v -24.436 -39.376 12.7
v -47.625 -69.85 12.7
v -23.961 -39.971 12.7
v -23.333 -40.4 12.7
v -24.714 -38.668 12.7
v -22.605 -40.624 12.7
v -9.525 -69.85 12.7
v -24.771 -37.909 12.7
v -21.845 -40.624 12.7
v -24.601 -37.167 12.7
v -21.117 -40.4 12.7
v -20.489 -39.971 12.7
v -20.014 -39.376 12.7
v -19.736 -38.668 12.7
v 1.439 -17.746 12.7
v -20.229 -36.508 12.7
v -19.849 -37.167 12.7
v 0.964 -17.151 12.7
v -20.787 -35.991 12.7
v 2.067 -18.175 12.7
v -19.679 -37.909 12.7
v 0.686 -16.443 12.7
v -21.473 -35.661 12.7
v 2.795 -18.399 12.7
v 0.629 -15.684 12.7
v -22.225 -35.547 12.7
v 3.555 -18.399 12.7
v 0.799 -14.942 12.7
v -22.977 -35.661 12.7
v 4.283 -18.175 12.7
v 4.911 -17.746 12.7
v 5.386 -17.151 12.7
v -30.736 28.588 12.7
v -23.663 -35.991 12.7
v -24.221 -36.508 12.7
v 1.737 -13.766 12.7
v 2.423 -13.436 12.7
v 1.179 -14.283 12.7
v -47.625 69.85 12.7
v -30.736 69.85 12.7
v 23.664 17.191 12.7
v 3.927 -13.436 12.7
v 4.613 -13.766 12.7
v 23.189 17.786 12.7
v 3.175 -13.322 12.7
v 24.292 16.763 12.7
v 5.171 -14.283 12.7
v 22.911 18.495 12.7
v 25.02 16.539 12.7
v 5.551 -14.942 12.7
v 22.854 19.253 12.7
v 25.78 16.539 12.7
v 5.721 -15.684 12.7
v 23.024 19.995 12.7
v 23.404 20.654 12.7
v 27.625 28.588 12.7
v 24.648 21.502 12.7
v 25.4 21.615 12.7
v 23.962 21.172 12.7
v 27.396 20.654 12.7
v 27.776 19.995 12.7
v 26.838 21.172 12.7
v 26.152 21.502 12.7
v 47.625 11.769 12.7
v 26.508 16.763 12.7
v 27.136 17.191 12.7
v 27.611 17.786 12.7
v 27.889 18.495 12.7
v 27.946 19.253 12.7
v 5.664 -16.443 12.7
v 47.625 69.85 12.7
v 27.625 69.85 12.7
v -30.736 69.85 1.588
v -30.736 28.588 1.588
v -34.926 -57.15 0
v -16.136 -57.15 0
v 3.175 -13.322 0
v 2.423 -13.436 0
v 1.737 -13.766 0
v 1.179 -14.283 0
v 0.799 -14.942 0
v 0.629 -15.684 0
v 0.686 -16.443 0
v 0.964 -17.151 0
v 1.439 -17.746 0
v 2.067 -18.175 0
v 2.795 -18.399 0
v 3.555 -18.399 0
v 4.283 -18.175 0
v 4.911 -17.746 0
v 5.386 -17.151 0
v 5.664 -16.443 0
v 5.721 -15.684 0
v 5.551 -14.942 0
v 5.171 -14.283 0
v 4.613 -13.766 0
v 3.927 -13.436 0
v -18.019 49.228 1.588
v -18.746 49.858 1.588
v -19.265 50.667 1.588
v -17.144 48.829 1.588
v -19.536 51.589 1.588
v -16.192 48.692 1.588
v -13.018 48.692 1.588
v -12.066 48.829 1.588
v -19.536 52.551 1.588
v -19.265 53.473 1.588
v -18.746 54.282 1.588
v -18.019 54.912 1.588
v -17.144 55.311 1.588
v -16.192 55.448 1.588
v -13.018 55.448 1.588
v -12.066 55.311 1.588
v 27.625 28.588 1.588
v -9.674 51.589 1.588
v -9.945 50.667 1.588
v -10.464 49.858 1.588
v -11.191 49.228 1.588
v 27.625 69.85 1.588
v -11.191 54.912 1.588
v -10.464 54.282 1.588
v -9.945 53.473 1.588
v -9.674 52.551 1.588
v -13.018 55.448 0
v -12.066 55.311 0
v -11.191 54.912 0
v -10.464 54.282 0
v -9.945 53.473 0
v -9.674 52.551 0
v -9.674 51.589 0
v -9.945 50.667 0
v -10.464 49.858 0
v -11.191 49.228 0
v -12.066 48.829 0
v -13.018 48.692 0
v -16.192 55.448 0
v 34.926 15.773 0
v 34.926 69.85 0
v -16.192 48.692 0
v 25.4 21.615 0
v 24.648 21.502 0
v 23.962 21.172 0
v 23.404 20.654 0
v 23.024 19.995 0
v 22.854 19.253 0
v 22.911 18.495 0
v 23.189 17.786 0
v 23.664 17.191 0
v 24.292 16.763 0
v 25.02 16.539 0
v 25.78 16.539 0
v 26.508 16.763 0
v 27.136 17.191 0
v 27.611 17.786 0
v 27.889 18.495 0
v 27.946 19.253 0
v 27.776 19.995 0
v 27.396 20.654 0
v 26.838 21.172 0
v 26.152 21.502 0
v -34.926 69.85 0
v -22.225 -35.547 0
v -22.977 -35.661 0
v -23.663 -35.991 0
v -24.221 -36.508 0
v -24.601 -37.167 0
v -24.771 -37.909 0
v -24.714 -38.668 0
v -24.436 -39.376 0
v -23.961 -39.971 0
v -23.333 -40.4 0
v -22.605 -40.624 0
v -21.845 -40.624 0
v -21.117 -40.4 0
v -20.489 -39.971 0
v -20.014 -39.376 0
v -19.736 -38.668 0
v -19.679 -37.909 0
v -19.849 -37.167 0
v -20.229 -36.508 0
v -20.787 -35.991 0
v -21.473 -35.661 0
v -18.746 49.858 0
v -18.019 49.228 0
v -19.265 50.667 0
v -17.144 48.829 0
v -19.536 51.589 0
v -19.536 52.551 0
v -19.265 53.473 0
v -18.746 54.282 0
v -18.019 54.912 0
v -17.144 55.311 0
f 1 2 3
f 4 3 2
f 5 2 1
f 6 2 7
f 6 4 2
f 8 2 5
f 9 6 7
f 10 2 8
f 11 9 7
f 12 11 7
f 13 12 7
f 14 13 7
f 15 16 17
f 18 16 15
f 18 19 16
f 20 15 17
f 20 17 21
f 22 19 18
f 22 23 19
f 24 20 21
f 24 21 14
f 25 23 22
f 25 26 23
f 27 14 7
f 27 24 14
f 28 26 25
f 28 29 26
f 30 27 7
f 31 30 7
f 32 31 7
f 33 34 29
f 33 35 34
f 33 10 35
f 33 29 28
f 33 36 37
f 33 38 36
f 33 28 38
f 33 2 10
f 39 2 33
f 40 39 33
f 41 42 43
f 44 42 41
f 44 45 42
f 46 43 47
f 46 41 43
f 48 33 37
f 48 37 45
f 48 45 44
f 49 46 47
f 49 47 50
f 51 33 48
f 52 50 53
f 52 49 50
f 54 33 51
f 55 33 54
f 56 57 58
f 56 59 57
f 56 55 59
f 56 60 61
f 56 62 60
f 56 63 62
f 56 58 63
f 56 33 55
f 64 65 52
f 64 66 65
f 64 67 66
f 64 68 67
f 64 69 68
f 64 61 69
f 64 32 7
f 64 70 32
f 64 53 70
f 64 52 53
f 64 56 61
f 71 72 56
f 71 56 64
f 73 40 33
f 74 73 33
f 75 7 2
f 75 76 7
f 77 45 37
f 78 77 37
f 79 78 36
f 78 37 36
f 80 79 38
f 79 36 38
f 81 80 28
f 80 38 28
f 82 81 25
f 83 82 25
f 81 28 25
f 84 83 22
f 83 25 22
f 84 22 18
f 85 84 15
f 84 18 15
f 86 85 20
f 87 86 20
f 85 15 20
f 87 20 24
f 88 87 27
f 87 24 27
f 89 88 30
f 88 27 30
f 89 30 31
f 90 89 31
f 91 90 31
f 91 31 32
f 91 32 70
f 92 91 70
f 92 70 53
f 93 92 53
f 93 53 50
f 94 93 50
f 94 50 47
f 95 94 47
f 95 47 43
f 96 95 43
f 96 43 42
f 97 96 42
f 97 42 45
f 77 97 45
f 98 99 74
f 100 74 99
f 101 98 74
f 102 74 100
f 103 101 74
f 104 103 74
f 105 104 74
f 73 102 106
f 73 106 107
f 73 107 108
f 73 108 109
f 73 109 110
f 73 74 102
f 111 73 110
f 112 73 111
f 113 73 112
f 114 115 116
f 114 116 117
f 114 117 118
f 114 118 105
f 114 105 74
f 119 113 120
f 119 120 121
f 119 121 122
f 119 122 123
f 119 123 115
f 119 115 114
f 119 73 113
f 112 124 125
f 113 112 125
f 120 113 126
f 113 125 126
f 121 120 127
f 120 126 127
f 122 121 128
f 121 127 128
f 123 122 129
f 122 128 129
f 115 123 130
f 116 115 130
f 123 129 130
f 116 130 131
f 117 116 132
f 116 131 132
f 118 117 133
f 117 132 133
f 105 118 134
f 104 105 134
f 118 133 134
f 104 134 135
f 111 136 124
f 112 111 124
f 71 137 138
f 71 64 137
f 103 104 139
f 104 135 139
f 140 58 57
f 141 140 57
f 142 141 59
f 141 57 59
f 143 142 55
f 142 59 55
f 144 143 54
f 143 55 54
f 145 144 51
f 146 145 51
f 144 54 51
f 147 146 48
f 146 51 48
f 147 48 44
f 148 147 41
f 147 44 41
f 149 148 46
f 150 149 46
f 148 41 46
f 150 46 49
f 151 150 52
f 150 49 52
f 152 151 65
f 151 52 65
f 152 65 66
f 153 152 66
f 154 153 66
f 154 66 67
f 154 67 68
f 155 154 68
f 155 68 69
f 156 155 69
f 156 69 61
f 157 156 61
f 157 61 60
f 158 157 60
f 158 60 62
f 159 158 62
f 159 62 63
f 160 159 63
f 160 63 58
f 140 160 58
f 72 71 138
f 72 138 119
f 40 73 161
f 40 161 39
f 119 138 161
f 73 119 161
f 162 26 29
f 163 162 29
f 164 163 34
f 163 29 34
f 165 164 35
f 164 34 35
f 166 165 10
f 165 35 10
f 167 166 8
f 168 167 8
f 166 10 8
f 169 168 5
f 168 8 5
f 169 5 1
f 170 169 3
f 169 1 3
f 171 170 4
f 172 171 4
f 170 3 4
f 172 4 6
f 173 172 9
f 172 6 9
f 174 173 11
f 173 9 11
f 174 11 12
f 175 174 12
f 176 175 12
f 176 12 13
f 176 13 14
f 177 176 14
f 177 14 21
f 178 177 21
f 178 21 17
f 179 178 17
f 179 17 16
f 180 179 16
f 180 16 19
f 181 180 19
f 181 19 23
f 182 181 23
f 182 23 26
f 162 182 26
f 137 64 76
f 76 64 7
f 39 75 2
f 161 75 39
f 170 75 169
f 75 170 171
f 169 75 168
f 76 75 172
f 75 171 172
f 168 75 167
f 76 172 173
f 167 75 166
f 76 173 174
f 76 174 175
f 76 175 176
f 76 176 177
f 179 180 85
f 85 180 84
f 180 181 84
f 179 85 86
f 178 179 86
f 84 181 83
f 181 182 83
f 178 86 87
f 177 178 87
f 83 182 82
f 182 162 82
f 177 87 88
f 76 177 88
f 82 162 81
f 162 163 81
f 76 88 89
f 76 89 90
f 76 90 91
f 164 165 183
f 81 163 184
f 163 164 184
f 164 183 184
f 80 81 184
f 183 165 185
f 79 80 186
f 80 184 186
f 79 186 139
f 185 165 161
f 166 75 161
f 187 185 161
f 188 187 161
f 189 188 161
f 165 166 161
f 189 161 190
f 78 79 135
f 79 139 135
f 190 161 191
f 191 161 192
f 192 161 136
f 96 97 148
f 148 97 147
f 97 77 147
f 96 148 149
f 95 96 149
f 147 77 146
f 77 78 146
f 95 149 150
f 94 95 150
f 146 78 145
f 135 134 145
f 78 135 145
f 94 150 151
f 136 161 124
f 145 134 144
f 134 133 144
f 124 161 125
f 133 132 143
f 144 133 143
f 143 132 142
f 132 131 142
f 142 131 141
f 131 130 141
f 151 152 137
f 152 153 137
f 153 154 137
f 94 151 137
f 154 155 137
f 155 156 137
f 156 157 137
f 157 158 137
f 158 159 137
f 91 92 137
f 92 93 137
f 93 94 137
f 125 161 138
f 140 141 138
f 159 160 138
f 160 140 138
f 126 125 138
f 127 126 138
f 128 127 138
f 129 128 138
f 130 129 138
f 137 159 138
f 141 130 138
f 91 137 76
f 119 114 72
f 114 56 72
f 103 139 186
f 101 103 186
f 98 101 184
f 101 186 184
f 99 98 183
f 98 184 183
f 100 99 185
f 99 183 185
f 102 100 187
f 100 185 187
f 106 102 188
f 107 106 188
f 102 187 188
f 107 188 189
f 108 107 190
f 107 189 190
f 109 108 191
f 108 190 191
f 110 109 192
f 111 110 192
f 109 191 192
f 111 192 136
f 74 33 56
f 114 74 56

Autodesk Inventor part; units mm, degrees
ref_plane "YZ Plane" through (0, 0, 0) normal (1, 0, 0) x (0, 1, 0)
ref_plane "XZ Plane" through (0, 0, 0) normal (0, 1, 0) x (-1, 0, 0)
sketch "Sketch1" plane through (0, 0, 0) normal (0, 0, 1) x (1, 0, 0)
  line L0 (-47.625, -69.85) -> (47.625, -69.85)
  line L1 (47.625, -69.85) -> (47.625, 69.85)
  line L2 (47.625, 69.85) -> (-47.625, 69.85)
  line L3 (-47.625, 69.85) -> (-47.625, -69.85)
  line L4 (-47.625, -69.85) -> (47.625, 69.85) construction
  line L5 (47.625, -69.85) -> (-47.625, 69.85) construction
  point P0 (0, 0)
  dimension "d2" = 95.25
  dimension "d3" = 139.7
extrude "Extrusion1" add sketch "Sketch1" along normal blind 12.7
sketch "Sketch5" plane through (0, 0, 0) normal (0, 0, -1) x (-1, 0, 0)
  circle A0 centre (68.072, -112.9665) radius 2.5527 projected
  circle A1 centre (17.272, -112.9665) radius 2.5527 projected
  circle A2 centre (-33.528, -112.9665) radius 2.5527 projected
  circle A3 centre (-84.328, -112.9665) radius 2.5527 projected
  circle A4 centre (-135.128, -112.9665) radius 2.5527 projected
  circle A5 centre (-185.928, -112.9665) radius 2.5527 projected
  circle A6 centre (-211.328, -112.9665) radius 2.5527 projected
  circle A7 centre (-160.528, -112.9665) radius 2.5527 projected
  circle A8 centre (-109.728, -112.9665) radius 2.5527 projected
  circle A9 centre (-58.928, -112.9665) radius 2.5527 projected
  circle A10 centre (-8.128, -112.9665) radius 2.5527 projected
  circle A11 centre (42.672, -112.9665) radius 2.5527 projected
  circle A12 centre (93.472, -112.9665) radius 2.5527 projected
  circle A13 centre (-62.484, -38.6715) radius 3.429 projected
  circle A14 centre (-62.484, 33.7185) radius 3.429 projected
  arc A15 (-54.102, -15.1765) -> (-44.45, -15.1765) centre (-49.276, -15.1765) ccw projected
  line L0 (-44.45, -15.1765) -> (-44.45, 10.2235) projected
  arc A16 (-44.45, 10.2235) -> (-54.102, 10.2235) centre (-49.276, 10.2235) ccw projected
  line L1 (-54.102, 10.2235) -> (-54.102, -15.1765) projected
  arc A17 (-228.854, -15.1765) -> (-219.202, -15.1765) centre (-224.028, -15.1765) ccw projected
  line L2 (-219.202, -15.1765) -> (-219.202, 10.2235) projected
  arc A18 (-219.202, 10.2235) -> (-228.854, 10.2235) centre (-224.028, 10.2235) ccw projected
  line L3 (-228.854, 10.2235) -> (-228.854, -15.1765) projected
  circle A19 centre (-218.3546, -258.6355) radius 2.413 projected
  circle A20 centre (-78.4098, -256.2225) radius 2.413 projected
  circle A21 centre (-78.4098, -297.1165) radius 2.413 projected
  circle A22 centre (-218.3546, -294.7035) radius 2.413 projected
  circle A23 centre (112.522, -87.5665) radius 2.0701 projected
  circle A24 centre (112.522, -138.3665) radius 2.0701 projected
  circle A25 centre (-243.078, 64.8335) radius 2.0701 projected
  circle A26 centre (-243.078, 14.0335) radius 2.0701 projected
  circle A27 centre (-243.078, -36.7665) radius 2.0701 projected
  circle A28 centre (-243.078, -87.5665) radius 2.0701 projected
  circle A29 centre (-243.078, -138.3665) radius 2.0701 projected
  circle A30 centre (-243.078, -189.1665) radius 2.0701 projected
  circle A31 centre (-243.078, -239.9665) radius 2.0701 projected
  circle A32 centre (-243.078, -290.7665) radius 2.0701 projected
  circle A33 centre (-243.078, -265.3665) radius 2.0701 projected
  circle A34 centre (-243.078, -214.5665) radius 2.0701 projected
  circle A35 centre (-243.078, -163.7665) radius 2.0701 projected
  circle A36 centre (-243.078, -112.9665) radius 2.0701 projected
  circle A37 centre (-243.078, -62.1665) radius 2.0701 projected
  circle A38 centre (-243.078, -11.3665) radius 2.0701 projected
  circle A39 centre (-243.078, 39.4335) radius 2.0701 projected
  circle A40 centre (112.522, -163.7665) radius 2.0701 projected
  circle A41 centre (112.522, -112.9665) radius 2.0701 projected
  circle A42 centre (112.522, -62.1665) radius 2.0701 projected
  arc A43 (-45.1979, 77.5335) -> (-51.5479, 83.8835) centre (-51.5479, 77.5335) ccw projected
  line L4 (-45.1979, 77.5335) -> (-45.1979, 54.7638) projected
  arc A44 (-45.1979, 54.7638) -> (-43.3381, 50.2736) centre (-38.8479, 54.7638) ccw projected
  line L5 (-43.3381, 50.2736) -> (29.1422, -22.2066) projected
  arc A45 (31.0021, -26.6968) -> (29.1422, -22.2066) centre (24.6521, -26.6968) ccw projected
  line L6 (31.0021, -26.6968) -> (31.0021, -43.1165) projected
  arc A46 (31.0021, -43.1165) -> (37.3521, -49.4665) centre (37.3521, -43.1165) ccw projected
  line L7 (37.3521, -49.4665) -> (118.872, -49.4665) projected
  line L8 (118.872, -176.4665) -> (118.872, -49.4665) projected
  line L9 (118.872, -176.4665) -> (37.3521, -176.4665) projected
  arc A47 (37.3521, -176.4665) -> (31.0021, -182.8165) centre (37.3521, -182.8165) ccw projected
  line L10 (31.0021, -182.8165) -> (31.0021, -199.2362) projected
  arc A48 (29.1422, -203.7264) -> (31.0021, -199.2362) centre (24.6521, -199.2362) ccw projected
  line L11 (29.1422, -203.7264) -> (-43.3381, -276.2066) projected
  arc A49 (-43.3381, -276.2066) -> (-45.1979, -280.6968) centre (-38.8479, -280.6968) ccw projected
  line L12 (-45.1979, -280.6968) -> (-45.1979, -303.4665) projected
  arc A50 (-51.5479, -309.8165) -> (-45.1979, -303.4665) centre (-51.5479, -303.4665) ccw projected
  line L13 (-249.428, -309.8165) -> (-51.5479, -309.8165) projected
  line L14 (-249.428, 83.8835) -> (-249.428, -309.8165) projected
  line L15 (-51.5479, 83.8835) -> (-249.428, 83.8835) projected
  line L16 (-47.625, -69.85) -> (-47.625, 69.85) projected
  line L17 (47.625, 69.85) -> (47.625, -69.85) projected
  line L18 (47.625, -69.85) -> (-47.625, -69.85) projected
  line L19 (28.575, 28.5877) -> (-28.575, 28.5877) projected
  circle A51 centre (19.05, -44.45) radius 3.3782 projected
  circle A52 centre (-22.225, 19.0627) radius 3.3782 projected
  point P0 (0, 0)
  point P1 (22.225, -38.1)
  point P2 (-25.4, 19.0627)
  point P3 (20.684, -69.85)
  point P4 (-44.45, 19.0627)
  point P5 (19.05, -69.85)
  point P6 (-3.175, -15.875)
  dimension "d47" = 25.4
  dimension "d53" = 22.225
  dimension "d64" = 19.0627
  dimension "d65" = 38.1
  dimension "d108" = 25.4
  dimension "d109" = 53.975
hole "Hole1" at (-22.225, -38.1, 0) at (25.4, 19.0627, 0) at (3.175, -15.875, 0) direction (0, 0, 1) diameter 5.1054 end through all clearance for "Flat Head Machine Screw (82)" size "#10" standard "Ansi Unified Screw Threads"
ref_plane "Work Plane1" through (-41.275, 69.85, 0) normal (0, -1, 0) x (0, 0, -1)
sketch "Sketch7" plane through (0, 0, 12.7) normal (0, 0, 1) x (1, 0, 0)
  line L0 (-9.525, -69.85) -> (47.625, 11.7687)
  line L1 (-47.625, -69.85) -> (47.625, -69.85) projected
  line L2 (-47.625, 69.85) -> (-47.625, -69.85)
  line L3 (47.625, -69.85) -> (47.625, 69.85) projected
  line L4 (47.625, 69.85) -> (-47.625, 69.85) projected
  line L5 (27.625, 69.85) -> (-30.7357, 69.85)
  line L6 (-30.7357, 69.85) -> (-30.7357, 28.5877)
  line L7 (-30.7357, 28.5877) -> (27.625, 28.5877)
  line L8 (-16.7842, 38.1127) -> (14.9658, 38.1127) projected
  line L9 (-16.7842, 50.8127) -> (14.9658, 50.8127) projected
  line L10 (14.9658, 50.8127) -> (14.9658, 38.1127)
  line L11 (-16.7842, 50.8127) -> (-16.7842, 38.1127)
  line L12 (20.4436, 50.8127) -> (24.45, 50.8127) projected
  line L13 (24.0601, 50.8127) -> (24.45, 50.8127) projected
  line L14 (24.0601, 50.8127) -> (-14.952, 50.8127) projected
  line L15 (20.4436, 50.8127) -> (17.9874, 50.8127) projected
  line L16 (-2.2262, 50.8127) -> (17.9874, 50.8127) projected
  line L17 (-2.2262, 52.3875) -> (17.9874, 52.3875) projected
  line L18 (17.9874, 52.3875) -> (20.4436, 52.3875) projected
  line L19 (20.4436, 52.3875) -> (24.45, 52.3875) projected
  line L20 (24.45, 50.8127) -> (24.45, 52.3875) projected
  line L21 (-21.2107, 52.3875) -> (-9.8426, 52.3875) projected
  line L22 (-9.8426, 52.3875) -> (-7.673, 52.3875) projected
  line L23 (-7.673, 52.3875) -> (-5.0722, 52.3875) projected
  line L24 (-5.0722, 52.3875) -> (-2.2262, 52.3875) projected
  line L25 (27.625, 28.5877) -> (27.625, 69.85)
  dimension "d72" = 9.525
  dimension "d73" = 3.175
  dimension "d74" = 9.525
  dimension "d80" = 38.1
  dimension "d84" = 55
extrude "Extrusion7" cut sketch "Sketch7" against normal blind 11.1125 contours L25 L7 L6 L4 | L11 L9 L10 L8
extrude "Extrusion9" cut sketch "Sketch7" against normal through all contours L0 L3 L1
chamfer "Chamfer3" distance 12.7 angle 45 4 edges at (47.625, 40.8093, 0) (19.05, -29.0407, 0) (-47.625, 0, 0) (-28.575, -69.85, 0)
sketch "Sketch8" plane through (0, 0, 0) normal (0, 0, -1) x (-1, 0, 0)
  line L0 (16.1925, 52.07) -> (13.0175, 52.07) construction
  line L1 (16.1925, 55.4482) -> (13.0175, 55.4482)
  line L2 (13.0175, 48.6918) -> (16.1925, 48.6918)
  arc A0 (16.1925, 48.6918) -> (16.1925, 55.4482) centre (16.1925, 52.07) ccw
  arc A1 (13.0175, 55.4482) -> (13.0175, 48.6918) centre (13.0175, 52.07) ccw
  line L3 (34.925, 69.85) -> (34.925, -57.15) projected
  line L4 (-34.925, 69.85) -> (34.925, 69.85) projected
  point P0 (0, 0)
  point P1 (14.605, 52.07)
  dimension "d88" = 3.3782
  dimension "d89" = 3.175
  dimension "d90" = 20.32
  dimension "d91" = 17.78
extrude "Extrusion10" cut sketch "Sketch8" against normal blind 11.1125
sketch "Sketch10" plane through (0, 0, 12.7) normal (0, 0, 1) x (1, 0, 0)
  line L0 (-9.525, -69.85) -> (47.625, 11.7687) projected
  line L1 (47.625, 11.7687) -> (47.625, 69.85) projected
  line L2 (47.625, 69.85) -> (27.625, 69.85) projected
  line L3 (27.625, 69.85) -> (27.625, 28.5877) projected
  line L4 (27.625, 28.5877) -> (-30.7357, 28.5877) projected
  line L5 (-30.7357, 28.5877) -> (-30.7357, 69.85) projected
  line L6 (-30.7357, 69.85) -> (-47.625, 69.85) projected
  line L7 (-47.625, 69.85) -> (-47.625, -69.85) projected
  line L8 (-47.625, -69.85) -> (-9.525, -69.85) projected
  circle A0 centre (25.4, 19.0627) radius 2.5527 projected
  circle A1 centre (-22.225, -38.1) radius 2.5527 projected
  circle A2 centre (3.175, -15.875) radius 2.5527 projected
  arc A3 (-13.0175, 48.6918) -> (-13.0175, 55.4482) centre (-13.0175, 52.07) ccw projected
  line L9 (-13.0175, 48.6918) -> (-16.1925, 48.6918) projected
  arc A4 (-16.1925, 55.4482) -> (-16.1925, 48.6918) centre (-16.1925, 52.07) ccw projected
  line L10 (-16.1925, 55.4482) -> (-13.0175, 55.4482) projected
  line L11 (-30.7357, 69.85) -> (27.625, 69.85) projected
  line L12 (-30.7357, 28.5877) -> (-30.7357, 69.85) projected
  line L13 (27.625, 28.5877) -> (-30.7357, 28.5877) projected
  line L14 (27.625, 69.85) -> (27.625, 28.5877) projected
  point P0 (0, 0)
properties part number "C34_TK_UnderCarriageGuardPlate" material "Polycarbonate, Clear"
